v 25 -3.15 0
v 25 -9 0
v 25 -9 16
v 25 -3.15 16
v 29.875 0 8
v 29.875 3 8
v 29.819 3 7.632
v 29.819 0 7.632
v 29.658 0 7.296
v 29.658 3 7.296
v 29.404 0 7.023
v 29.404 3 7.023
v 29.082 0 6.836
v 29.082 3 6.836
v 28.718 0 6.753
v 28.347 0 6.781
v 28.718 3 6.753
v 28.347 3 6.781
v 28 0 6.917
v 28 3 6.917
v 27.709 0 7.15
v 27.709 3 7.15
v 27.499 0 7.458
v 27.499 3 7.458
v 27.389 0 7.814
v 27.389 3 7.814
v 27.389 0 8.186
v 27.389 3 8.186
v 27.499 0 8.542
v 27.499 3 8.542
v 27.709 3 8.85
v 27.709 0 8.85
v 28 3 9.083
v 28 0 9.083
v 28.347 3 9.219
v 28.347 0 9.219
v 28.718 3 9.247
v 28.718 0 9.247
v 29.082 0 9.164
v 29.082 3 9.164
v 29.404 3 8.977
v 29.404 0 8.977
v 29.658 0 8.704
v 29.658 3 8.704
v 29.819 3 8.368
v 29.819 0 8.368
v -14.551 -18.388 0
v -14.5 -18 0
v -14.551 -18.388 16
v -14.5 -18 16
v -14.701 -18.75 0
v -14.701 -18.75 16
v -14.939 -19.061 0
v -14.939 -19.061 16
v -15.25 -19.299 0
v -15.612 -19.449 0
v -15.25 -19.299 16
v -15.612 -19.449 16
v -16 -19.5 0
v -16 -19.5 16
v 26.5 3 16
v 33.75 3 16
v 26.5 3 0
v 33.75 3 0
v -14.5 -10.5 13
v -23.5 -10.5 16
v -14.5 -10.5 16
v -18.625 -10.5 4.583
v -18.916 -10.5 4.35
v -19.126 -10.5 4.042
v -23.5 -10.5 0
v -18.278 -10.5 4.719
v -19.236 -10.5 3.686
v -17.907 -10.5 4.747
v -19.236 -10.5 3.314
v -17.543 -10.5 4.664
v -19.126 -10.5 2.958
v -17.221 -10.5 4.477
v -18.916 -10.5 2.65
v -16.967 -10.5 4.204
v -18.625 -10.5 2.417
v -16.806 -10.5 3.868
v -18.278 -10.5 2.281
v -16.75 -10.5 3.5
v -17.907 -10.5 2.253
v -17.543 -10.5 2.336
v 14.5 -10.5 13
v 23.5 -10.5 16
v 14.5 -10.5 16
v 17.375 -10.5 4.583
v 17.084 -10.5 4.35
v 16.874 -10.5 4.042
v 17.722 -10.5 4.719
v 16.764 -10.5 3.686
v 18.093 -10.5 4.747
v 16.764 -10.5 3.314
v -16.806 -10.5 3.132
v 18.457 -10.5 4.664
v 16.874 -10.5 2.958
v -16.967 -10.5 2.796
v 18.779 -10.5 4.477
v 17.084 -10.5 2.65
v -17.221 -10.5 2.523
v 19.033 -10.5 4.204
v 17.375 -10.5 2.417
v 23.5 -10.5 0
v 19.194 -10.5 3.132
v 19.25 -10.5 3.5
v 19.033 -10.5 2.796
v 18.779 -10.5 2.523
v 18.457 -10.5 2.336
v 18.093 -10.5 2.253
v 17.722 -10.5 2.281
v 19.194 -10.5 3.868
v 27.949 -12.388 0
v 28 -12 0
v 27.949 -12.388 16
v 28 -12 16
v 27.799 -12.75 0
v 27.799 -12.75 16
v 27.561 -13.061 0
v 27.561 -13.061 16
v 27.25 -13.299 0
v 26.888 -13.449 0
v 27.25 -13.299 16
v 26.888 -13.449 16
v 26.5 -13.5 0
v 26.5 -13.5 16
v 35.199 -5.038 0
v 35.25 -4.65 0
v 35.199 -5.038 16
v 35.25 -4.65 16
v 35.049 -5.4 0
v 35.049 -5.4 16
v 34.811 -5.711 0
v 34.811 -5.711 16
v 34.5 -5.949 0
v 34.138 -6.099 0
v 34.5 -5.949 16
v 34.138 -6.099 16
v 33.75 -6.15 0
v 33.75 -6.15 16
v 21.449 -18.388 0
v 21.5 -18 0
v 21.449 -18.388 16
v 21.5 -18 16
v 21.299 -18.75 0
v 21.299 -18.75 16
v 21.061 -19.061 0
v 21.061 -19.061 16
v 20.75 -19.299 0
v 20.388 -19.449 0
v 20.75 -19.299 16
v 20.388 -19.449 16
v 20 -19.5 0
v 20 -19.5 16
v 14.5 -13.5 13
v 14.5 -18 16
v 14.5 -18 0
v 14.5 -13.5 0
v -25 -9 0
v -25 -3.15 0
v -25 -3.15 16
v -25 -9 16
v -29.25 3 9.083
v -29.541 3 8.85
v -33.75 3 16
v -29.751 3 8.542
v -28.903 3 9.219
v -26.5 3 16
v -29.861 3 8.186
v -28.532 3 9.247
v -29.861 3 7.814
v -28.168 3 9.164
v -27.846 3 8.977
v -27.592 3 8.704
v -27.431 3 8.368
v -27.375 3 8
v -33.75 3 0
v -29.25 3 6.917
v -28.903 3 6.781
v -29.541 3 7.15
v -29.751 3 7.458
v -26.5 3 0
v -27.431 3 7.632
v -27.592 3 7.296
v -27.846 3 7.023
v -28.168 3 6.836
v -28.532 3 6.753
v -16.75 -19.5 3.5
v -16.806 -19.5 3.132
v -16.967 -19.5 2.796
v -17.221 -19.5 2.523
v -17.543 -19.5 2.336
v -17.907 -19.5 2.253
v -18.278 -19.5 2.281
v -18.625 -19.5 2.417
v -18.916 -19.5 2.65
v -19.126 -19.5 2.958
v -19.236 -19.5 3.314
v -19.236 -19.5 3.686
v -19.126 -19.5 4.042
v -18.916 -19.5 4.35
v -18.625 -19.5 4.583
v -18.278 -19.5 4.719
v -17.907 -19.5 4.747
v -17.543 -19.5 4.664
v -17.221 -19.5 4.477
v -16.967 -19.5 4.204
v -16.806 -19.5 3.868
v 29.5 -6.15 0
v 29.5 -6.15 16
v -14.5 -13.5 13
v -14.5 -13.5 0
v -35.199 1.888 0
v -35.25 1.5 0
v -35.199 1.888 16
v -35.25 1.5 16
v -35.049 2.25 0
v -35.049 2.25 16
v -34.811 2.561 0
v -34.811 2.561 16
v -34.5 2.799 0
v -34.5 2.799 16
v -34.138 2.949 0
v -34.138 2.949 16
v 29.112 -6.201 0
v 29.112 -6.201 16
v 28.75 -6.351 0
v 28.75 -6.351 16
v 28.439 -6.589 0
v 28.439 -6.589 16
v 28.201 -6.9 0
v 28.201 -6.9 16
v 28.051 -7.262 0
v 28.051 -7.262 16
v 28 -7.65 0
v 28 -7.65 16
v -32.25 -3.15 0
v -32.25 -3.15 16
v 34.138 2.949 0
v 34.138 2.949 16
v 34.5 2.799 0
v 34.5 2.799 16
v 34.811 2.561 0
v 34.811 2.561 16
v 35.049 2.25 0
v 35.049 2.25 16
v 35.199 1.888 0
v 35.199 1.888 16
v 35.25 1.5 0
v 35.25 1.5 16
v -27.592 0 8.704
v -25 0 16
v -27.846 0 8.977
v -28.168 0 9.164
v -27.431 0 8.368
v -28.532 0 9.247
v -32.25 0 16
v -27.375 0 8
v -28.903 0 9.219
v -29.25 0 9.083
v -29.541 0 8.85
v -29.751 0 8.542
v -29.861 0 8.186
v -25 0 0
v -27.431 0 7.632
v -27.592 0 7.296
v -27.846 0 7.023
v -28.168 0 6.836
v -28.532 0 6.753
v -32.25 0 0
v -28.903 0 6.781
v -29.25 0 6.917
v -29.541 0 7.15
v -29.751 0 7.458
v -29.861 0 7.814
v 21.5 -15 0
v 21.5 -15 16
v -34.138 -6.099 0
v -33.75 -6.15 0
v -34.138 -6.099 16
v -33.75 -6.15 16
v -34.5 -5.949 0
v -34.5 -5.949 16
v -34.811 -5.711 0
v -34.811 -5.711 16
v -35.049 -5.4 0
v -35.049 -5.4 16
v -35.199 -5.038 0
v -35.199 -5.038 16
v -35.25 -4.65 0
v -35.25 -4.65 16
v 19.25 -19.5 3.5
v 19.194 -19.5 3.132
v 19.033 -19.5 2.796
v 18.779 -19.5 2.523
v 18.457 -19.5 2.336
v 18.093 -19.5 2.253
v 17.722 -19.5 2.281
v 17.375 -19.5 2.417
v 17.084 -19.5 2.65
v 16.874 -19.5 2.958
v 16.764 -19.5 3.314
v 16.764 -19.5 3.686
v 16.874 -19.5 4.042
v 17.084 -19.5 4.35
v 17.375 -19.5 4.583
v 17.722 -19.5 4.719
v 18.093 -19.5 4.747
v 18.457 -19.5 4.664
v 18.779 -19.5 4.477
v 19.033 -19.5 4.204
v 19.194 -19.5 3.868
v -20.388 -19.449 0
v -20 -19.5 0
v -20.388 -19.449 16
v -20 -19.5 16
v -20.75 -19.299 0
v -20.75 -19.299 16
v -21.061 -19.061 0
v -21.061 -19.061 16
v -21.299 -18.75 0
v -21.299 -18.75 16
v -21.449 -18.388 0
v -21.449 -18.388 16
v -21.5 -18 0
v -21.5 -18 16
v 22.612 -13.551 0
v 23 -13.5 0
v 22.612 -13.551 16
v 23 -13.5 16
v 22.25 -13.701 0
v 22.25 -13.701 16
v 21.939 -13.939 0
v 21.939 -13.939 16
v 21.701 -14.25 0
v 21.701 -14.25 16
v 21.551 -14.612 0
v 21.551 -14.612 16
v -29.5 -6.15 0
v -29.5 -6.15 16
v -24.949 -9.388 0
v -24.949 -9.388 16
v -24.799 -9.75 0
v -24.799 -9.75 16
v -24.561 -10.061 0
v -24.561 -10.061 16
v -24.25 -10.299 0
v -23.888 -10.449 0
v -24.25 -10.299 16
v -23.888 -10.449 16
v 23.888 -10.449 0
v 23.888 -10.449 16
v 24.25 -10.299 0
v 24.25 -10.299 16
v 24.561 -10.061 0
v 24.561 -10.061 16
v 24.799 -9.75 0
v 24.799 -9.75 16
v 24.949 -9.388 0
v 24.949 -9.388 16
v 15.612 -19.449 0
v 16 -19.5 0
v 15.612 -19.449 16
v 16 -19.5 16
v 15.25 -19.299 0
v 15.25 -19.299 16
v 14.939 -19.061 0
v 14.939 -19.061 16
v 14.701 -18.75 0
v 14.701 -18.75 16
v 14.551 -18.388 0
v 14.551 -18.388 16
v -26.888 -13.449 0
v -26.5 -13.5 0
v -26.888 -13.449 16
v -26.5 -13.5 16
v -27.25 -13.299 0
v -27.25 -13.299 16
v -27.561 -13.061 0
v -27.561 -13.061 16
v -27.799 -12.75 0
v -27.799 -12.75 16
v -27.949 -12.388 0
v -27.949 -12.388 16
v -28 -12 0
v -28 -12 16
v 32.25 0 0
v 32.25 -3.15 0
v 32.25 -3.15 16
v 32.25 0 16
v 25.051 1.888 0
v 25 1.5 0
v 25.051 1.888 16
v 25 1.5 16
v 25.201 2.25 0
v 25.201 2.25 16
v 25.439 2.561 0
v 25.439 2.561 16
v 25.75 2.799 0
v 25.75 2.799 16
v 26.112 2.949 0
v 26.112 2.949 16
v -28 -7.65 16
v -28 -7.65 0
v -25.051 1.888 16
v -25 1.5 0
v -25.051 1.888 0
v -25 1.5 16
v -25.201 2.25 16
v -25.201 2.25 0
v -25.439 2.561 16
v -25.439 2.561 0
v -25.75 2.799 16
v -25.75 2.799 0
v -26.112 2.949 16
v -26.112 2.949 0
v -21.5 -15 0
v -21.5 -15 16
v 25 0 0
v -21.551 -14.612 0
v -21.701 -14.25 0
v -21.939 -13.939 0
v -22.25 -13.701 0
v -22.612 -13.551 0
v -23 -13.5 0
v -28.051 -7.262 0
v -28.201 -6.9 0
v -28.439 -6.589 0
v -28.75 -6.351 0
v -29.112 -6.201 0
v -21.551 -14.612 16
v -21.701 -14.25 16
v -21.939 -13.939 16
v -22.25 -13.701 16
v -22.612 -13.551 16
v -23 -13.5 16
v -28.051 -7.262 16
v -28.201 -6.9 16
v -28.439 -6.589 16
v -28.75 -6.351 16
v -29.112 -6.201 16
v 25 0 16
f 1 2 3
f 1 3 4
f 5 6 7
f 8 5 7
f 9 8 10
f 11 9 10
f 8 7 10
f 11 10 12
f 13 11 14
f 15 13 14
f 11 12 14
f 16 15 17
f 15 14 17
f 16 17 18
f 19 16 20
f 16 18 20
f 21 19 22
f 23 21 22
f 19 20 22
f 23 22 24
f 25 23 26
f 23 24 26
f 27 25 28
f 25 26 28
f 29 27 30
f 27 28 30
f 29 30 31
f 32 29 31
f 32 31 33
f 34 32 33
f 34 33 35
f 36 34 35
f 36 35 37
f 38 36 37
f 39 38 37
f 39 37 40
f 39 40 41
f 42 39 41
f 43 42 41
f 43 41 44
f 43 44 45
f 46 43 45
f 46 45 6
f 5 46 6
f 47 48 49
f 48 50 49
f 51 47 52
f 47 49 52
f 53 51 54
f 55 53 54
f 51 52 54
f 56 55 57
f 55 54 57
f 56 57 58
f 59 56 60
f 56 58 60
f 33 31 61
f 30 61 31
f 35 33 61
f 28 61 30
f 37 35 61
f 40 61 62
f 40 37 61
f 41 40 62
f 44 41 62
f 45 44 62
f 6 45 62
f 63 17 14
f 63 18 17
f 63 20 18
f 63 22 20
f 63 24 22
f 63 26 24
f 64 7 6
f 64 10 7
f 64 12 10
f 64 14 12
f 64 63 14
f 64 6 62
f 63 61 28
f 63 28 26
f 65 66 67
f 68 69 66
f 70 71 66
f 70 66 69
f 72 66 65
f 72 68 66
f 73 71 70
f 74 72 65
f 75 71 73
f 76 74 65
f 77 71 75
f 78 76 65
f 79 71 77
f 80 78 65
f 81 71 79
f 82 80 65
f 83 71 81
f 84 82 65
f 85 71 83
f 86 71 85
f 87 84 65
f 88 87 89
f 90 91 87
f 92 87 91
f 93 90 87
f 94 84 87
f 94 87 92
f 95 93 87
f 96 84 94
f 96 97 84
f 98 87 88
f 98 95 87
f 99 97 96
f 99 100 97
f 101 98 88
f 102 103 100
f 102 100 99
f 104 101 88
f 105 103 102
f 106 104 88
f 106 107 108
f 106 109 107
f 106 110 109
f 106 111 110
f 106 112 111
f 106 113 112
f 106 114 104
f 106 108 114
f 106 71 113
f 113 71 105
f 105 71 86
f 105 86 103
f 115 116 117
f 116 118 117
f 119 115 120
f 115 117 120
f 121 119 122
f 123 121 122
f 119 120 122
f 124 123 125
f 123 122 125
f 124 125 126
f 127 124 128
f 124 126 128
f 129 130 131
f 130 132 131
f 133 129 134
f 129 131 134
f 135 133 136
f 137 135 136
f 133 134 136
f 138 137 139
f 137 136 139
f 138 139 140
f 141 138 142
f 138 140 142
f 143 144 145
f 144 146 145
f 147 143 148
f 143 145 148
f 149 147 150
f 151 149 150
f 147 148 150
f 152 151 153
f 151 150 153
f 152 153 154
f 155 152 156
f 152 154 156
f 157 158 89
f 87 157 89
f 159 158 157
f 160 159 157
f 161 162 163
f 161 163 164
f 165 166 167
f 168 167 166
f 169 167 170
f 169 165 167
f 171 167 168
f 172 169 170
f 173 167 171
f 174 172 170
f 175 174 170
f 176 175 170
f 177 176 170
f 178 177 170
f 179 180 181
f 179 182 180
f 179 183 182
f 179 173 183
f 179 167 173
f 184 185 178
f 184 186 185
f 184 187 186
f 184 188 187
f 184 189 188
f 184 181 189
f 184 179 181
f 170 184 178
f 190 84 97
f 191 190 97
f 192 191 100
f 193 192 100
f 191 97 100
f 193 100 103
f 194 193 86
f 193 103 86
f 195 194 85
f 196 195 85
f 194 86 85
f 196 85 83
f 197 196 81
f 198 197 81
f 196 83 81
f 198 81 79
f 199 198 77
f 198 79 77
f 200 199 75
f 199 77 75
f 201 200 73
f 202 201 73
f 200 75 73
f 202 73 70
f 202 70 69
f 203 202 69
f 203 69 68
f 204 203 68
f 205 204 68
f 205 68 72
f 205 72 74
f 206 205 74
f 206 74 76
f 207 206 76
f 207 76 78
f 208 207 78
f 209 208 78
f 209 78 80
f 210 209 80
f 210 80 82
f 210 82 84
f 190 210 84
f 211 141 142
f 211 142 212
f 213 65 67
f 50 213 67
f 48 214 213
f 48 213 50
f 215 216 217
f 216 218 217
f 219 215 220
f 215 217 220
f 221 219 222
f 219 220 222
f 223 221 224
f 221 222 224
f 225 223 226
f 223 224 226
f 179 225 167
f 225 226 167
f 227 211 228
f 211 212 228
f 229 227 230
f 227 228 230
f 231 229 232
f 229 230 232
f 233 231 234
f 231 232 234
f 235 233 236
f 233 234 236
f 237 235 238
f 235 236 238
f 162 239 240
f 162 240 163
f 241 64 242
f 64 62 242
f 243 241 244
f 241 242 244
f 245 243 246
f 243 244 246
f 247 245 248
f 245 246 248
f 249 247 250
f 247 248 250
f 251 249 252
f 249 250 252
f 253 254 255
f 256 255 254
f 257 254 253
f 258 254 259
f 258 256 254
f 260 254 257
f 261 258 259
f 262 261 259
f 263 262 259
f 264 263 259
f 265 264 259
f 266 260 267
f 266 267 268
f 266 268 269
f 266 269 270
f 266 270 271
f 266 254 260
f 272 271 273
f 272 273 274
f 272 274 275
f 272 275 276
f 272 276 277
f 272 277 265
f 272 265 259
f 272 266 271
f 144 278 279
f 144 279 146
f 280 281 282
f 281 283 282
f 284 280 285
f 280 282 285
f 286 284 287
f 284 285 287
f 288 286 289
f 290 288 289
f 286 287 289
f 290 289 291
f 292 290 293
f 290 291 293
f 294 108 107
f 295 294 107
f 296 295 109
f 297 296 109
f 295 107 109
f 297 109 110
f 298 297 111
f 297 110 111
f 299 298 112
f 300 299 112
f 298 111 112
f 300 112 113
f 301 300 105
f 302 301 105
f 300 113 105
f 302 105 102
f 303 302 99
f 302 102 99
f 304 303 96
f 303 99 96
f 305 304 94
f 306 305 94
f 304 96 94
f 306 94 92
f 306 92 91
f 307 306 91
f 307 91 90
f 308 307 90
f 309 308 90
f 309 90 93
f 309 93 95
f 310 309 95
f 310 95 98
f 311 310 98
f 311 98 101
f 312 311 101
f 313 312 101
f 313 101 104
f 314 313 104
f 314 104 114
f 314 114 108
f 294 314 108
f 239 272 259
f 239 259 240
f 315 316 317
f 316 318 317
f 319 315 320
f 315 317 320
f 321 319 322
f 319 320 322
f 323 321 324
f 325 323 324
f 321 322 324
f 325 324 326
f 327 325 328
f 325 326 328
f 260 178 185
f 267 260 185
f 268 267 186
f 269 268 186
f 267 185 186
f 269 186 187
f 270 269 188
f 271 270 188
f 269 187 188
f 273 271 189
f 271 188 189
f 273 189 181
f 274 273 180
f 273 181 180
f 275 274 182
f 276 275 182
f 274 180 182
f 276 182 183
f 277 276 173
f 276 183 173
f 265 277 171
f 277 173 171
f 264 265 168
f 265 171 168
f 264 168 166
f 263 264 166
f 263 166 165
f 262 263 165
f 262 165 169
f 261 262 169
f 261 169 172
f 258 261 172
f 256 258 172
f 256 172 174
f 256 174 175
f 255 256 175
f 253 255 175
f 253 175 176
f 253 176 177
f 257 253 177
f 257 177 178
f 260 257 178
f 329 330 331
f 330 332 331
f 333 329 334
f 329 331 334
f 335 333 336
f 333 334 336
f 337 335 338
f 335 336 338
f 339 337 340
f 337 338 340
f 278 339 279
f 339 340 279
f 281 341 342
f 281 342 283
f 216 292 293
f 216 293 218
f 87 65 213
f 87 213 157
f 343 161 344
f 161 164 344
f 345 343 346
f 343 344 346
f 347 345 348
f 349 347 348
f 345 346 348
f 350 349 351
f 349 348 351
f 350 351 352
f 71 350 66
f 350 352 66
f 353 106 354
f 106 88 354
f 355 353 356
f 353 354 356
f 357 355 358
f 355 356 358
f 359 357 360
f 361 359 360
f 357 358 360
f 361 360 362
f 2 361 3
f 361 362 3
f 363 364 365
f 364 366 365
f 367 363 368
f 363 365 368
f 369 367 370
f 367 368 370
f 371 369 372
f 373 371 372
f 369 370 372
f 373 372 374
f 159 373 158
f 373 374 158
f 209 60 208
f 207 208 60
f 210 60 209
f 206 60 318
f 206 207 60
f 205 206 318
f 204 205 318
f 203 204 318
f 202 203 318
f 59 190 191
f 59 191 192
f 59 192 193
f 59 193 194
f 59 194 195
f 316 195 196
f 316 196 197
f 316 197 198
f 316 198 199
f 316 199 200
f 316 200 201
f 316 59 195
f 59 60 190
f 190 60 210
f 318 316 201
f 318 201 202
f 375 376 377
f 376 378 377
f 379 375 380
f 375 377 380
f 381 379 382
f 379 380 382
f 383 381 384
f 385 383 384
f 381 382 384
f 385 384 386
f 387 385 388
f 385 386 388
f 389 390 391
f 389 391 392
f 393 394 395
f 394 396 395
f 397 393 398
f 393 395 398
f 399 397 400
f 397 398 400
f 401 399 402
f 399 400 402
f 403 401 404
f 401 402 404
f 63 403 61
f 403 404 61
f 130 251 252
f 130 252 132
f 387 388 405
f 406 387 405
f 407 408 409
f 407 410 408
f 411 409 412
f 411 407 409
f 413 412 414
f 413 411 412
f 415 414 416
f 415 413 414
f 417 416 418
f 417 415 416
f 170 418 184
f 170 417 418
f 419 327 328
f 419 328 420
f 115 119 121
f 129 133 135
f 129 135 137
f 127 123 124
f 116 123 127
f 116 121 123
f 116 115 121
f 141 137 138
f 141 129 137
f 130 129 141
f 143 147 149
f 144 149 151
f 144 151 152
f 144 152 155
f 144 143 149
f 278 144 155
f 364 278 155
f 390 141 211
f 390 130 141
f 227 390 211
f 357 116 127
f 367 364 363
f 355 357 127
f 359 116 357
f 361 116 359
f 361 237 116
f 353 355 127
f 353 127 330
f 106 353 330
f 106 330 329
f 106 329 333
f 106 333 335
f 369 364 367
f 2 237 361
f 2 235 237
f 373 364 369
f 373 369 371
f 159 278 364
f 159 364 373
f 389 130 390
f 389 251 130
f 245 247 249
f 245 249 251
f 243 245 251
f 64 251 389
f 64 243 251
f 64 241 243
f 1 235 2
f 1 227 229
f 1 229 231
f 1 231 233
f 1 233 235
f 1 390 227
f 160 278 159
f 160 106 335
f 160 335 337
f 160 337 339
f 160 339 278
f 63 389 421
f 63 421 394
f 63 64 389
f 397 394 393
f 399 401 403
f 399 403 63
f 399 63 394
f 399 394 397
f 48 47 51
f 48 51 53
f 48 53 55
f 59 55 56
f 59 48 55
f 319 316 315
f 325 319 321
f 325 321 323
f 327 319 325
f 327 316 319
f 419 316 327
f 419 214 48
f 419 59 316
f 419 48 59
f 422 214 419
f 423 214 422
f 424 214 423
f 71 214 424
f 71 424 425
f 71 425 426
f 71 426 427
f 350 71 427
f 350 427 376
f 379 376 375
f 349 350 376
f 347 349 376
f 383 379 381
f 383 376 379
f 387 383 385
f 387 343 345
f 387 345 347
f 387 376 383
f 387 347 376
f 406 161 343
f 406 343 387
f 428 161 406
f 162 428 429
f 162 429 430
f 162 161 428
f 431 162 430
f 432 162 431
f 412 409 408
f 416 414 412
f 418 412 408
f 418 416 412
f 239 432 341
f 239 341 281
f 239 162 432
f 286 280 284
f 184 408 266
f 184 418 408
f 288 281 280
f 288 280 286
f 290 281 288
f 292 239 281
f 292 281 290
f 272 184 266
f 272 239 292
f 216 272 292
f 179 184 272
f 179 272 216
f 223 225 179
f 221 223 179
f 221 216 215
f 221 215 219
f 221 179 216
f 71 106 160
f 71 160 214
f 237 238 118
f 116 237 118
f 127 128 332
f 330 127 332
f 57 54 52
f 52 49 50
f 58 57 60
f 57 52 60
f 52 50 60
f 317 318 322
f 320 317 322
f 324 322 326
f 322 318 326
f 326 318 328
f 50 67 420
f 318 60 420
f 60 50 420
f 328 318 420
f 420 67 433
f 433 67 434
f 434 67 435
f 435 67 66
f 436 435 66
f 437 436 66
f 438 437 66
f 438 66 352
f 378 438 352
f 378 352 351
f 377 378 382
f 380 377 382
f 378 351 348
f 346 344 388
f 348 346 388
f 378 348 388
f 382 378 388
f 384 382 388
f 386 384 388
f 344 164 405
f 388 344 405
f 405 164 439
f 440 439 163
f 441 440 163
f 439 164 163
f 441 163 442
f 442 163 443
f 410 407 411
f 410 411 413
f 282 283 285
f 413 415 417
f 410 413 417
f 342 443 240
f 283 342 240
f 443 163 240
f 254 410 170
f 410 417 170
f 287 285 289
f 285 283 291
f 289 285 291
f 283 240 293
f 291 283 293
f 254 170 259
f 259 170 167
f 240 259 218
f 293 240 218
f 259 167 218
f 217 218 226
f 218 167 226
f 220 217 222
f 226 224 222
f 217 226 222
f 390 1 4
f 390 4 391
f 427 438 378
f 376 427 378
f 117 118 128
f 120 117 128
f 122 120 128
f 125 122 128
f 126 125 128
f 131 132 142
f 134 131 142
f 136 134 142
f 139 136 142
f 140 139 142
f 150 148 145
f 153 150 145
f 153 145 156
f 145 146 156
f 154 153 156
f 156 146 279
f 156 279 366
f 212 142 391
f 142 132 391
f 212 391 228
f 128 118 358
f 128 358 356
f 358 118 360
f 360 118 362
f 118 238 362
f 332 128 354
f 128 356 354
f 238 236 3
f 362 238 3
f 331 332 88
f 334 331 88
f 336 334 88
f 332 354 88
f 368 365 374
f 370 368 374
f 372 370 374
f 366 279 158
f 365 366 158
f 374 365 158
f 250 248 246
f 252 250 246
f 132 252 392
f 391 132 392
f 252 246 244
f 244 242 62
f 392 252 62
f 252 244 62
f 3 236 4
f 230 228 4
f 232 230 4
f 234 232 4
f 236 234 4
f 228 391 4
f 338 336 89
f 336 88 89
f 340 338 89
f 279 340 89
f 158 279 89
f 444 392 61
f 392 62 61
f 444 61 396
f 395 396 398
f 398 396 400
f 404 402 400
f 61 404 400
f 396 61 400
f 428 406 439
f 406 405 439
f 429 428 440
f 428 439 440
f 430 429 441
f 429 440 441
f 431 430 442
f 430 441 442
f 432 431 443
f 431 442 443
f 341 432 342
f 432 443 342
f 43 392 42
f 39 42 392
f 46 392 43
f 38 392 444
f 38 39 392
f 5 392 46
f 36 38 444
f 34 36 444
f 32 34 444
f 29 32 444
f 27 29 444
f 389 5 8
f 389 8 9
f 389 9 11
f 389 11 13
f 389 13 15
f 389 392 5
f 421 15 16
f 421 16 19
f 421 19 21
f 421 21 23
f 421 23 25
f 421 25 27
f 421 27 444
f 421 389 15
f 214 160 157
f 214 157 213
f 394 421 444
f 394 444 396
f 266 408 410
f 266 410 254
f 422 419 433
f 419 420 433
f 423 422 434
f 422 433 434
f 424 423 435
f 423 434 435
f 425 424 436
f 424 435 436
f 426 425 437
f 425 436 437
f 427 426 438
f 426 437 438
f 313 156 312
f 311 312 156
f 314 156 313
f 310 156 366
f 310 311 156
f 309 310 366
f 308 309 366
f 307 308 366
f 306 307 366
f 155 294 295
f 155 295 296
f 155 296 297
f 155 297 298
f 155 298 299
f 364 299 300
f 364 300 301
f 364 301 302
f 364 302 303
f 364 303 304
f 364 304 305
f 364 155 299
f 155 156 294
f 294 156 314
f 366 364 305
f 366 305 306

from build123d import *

# Parameters (mm, degrees)
BOSS_EXTRUDE1_DEPTH = 16
SKETCH2_R           = 1.25
CUT_EXTRUDE1_DEPTH  = 10
CUT_EXTRUDE2_REACH  = 24.5
SKETCH4_R           = 1.25
FILLET1_R           = 1.5
SKETCH8_W           = 29
SKETCH8_H           = 3
CUT_EXTRUDE3_DEPTH  = 10


with BuildPart() as part:
    # Sketch1 → Boss-Extrude1 (new body)
    with BuildSketch(Plane.XY):
        Polygon((-32.25, 0), (-32.25, -3.15), (-25, -3.15), (-25, -10.5), (25, -10.5), (25, -3.15), (32.25, -3.15), (32.25, 0), (25, 0), (25, 3), (35.25, 3), (35.25, -6.15), (28, -6.15), (28, -13.5), (21.5, -13.5), (21.5, -19.5), (14.5, -19.5), (14.5, -13.5), (-14.5, -13.5), (-14.5, -19.5), (-21.5, -19.5), (-21.5, -13.5), (-28, -13.5), (-28, -6.15), (-35.25, -6.15), (-35.25, 3), (-25, 3), (-25, 0), align=None)
    extrude(amount=BOSS_EXTRUDE1_DEPTH)

    # Sketch2 → Cut-Extrude1 (cut, through all)
    with BuildSketch(Plane(origin=(0, -10.5, 0), x_dir=(1, 0, 0), z_dir=(0, 1, 0))):
        with Locations((-18, -3.5)):
            Circle(SKETCH2_R)
        with Locations((18, -3.5)):
            Circle(SKETCH2_R)
    extrude(amount=-CUT_EXTRUDE1_DEPTH, mode=Mode.SUBTRACT)

    # Sketch4 → Cut-Extrude2 (cut, up to next)
    with BuildSketch(Plane(origin=(0, 3, 0), x_dir=(1, 0, 0), z_dir=(0, 1, 0)), mode=Mode.PRIVATE) as cut_extrude2_sk1:
        with Locations((-28.625, -8)):
            Circle(SKETCH4_R)
    cut_extrude2_tool1 = extrude(cut_extrude2_sk1.sketch, amount=-CUT_EXTRUDE2_REACH, mode=Mode.PRIVATE) & part.part
    add(cut_extrude2_tool1.solids().sort_by_distance((-28.625, 3, 8))[0], mode=Mode.SUBTRACT)
    # Sketch4 → Cut-Extrude2 (cut, up to next)
    with BuildSketch(Plane(origin=(0, 3, 0), x_dir=(1, 0, 0), z_dir=(0, 1, 0)), mode=Mode.PRIVATE) as cut_extrude2_sk2:
        with Locations((28.625, -8)):
            Circle(SKETCH4_R)
    cut_extrude2_tool2 = extrude(cut_extrude2_sk2.sketch, amount=-CUT_EXTRUDE2_REACH, mode=Mode.PRIVATE) & part.part
    add(cut_extrude2_tool2.solids().sort_by_distance((28.625, 3, 8))[0], mode=Mode.SUBTRACT)

    # Fillet1
    fillet1_edges = [part.edges().sort_by_distance(p)[0] for p in [
        (-25, -10.5, 8),
        (25, -10.5, 8),
        (25, 3, 8),
        (35.25, 3, 8),
        (35.25, -6.15, 8),
        (28, -6.15, 8),
        (28, -13.5, 8),
        (21.5, -13.5, 8),
        (21.5, -19.5, 8),
        (14.5, -19.5, 8),
        (-14.5, -19.5, 8),
        (-21.5, -19.5, 8),
        (-21.5, -13.5, 8),
        (-28, -13.5, 8),
        (-28, -6.15, 8),
        (-35.25, -6.15, 8),
        (-35.25, 3, 8),
        (-25, 3, 8),
    ]]
    fillet(fillet1_edges, radius=FILLET1_R)

    # Sketch8 → Cut-Extrude3 (cut, through all)
    with BuildSketch(Plane(origin=(0, -10.5, 0), x_dir=(1, 0, 0), z_dir=(0, 1, 0))):
        with Locations((0, -14.5)):
            Rectangle(SKETCH8_W, SKETCH8_H)
    extrude(amount=-CUT_EXTRUDE3_DEPTH, mode=Mode.SUBTRACT)


solid = part.part
